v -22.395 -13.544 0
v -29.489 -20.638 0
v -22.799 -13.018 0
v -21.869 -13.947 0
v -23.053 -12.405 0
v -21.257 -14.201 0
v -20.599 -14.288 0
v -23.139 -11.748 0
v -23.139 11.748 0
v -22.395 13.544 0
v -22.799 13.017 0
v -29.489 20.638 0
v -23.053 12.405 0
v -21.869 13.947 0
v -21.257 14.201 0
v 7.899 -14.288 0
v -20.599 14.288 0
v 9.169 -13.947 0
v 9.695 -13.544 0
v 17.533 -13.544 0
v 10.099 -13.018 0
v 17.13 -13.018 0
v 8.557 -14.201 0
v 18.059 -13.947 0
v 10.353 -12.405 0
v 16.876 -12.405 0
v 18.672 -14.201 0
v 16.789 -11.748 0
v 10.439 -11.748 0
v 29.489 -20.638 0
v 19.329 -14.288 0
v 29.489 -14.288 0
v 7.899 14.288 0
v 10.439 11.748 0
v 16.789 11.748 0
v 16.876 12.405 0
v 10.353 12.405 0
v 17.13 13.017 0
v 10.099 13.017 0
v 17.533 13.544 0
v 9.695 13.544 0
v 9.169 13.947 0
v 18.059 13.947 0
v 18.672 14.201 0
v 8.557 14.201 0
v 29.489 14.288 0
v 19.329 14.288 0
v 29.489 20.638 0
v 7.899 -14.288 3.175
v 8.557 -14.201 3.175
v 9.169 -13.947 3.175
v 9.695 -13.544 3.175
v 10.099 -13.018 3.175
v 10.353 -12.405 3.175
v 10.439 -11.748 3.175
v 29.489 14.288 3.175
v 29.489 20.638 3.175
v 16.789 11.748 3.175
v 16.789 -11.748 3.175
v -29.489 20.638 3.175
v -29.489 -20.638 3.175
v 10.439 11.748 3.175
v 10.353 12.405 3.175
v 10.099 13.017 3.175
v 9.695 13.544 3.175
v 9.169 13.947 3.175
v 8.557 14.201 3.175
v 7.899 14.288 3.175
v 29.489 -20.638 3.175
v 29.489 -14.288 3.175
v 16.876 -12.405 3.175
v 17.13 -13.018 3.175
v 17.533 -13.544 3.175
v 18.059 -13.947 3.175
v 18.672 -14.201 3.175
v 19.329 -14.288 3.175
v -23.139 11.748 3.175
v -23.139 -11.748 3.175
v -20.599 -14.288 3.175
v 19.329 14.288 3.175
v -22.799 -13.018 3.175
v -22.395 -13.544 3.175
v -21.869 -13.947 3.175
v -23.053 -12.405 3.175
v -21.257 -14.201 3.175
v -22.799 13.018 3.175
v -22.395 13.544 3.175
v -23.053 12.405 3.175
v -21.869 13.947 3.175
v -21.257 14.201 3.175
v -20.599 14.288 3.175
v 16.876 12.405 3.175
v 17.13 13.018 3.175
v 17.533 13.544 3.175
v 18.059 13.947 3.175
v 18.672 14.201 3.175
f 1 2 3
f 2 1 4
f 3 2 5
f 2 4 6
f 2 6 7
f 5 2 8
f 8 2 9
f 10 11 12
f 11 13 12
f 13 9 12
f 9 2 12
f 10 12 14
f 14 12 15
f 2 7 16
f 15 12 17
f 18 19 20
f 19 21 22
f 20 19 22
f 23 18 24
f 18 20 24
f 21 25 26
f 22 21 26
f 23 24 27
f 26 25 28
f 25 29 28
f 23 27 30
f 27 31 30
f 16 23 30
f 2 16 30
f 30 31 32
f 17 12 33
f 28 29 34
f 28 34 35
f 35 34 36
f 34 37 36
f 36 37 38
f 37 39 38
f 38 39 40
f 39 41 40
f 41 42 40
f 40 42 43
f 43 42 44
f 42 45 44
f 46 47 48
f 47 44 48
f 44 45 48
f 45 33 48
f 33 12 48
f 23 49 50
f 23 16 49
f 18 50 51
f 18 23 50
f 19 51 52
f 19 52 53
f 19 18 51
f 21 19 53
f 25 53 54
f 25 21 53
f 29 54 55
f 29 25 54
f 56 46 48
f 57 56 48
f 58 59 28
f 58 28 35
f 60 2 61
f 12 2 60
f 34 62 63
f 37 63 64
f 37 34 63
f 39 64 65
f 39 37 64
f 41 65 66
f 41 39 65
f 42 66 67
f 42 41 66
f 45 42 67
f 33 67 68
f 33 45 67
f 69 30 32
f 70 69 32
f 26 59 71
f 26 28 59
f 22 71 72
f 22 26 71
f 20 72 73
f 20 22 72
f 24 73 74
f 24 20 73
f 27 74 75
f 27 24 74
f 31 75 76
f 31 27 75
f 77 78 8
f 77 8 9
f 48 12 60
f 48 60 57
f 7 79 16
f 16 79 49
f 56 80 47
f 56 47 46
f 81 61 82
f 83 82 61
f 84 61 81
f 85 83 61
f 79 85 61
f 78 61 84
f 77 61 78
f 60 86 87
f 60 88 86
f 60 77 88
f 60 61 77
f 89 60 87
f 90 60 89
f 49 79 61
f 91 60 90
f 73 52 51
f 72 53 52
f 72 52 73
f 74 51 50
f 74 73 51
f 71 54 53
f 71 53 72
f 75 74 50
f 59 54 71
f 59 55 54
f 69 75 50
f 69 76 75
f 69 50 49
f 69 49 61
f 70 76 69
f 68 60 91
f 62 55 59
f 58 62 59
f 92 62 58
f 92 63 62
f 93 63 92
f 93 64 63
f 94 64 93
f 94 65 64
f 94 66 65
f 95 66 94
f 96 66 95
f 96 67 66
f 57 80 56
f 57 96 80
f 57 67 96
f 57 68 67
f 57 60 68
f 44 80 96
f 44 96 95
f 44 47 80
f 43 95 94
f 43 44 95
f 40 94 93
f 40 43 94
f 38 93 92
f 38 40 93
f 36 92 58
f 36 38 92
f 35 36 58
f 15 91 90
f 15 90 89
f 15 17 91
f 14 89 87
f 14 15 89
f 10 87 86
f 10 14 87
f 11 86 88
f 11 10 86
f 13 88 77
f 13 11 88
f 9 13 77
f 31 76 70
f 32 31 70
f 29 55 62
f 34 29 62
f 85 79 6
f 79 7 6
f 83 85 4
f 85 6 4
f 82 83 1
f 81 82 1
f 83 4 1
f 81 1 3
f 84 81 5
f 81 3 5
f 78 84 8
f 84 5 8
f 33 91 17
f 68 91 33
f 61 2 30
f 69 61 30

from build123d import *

# Parameters (mm, degrees)
SKETCH1_W           = 58.9788
SKETCH1_H           = 41.275
BOSS_EXTRUDE1_DEPTH = 3.175
SKETCH2_W           = 12.7
SKETCH2_H           = 28.575
SKETCH2_W_2         = 33.5788
CUT_EXTRUDE1_DEPTH  = 37.133249835
FILLET1_R           = 2.54


with BuildPart() as part:
    # Sketch1 → Boss-Extrude1 (new body)
    with BuildSketch(Plane.XY):
        Rectangle(SKETCH1_W, SKETCH1_H)
    extrude(amount=BOSS_EXTRUDE1_DEPTH)

    # Sketch2 → Cut-Extrude1 (cut, through all)
    with BuildSketch(Plane.XY.offset(3.175)):
        with Locations((23.1394, 0)):
            Rectangle(SKETCH2_W, SKETCH2_H)
        with Locations((-6.35, 0)):
            Rectangle(SKETCH2_W_2, SKETCH2_H)
    extrude(amount=-CUT_EXTRUDE1_DEPTH, mode=Mode.SUBTRACT)

    # Fillet1
    fillet1_edges = [part.edges().sort_by_distance(p)[0] for p in [
        (16.7894, -14.2875, 1.5875),
        (16.7894, 14.2875, 1.5875),
        (10.4394, 14.2875, 1.5875),
        (10.4394, -14.2875, 1.5875),
        (-23.1394, -14.2875, 1.5875),
        (-23.1394, 14.2875, 1.5875),
    ]]
    fillet(fillet1_edges, radius=FILLET1_R)


solid = part.part
